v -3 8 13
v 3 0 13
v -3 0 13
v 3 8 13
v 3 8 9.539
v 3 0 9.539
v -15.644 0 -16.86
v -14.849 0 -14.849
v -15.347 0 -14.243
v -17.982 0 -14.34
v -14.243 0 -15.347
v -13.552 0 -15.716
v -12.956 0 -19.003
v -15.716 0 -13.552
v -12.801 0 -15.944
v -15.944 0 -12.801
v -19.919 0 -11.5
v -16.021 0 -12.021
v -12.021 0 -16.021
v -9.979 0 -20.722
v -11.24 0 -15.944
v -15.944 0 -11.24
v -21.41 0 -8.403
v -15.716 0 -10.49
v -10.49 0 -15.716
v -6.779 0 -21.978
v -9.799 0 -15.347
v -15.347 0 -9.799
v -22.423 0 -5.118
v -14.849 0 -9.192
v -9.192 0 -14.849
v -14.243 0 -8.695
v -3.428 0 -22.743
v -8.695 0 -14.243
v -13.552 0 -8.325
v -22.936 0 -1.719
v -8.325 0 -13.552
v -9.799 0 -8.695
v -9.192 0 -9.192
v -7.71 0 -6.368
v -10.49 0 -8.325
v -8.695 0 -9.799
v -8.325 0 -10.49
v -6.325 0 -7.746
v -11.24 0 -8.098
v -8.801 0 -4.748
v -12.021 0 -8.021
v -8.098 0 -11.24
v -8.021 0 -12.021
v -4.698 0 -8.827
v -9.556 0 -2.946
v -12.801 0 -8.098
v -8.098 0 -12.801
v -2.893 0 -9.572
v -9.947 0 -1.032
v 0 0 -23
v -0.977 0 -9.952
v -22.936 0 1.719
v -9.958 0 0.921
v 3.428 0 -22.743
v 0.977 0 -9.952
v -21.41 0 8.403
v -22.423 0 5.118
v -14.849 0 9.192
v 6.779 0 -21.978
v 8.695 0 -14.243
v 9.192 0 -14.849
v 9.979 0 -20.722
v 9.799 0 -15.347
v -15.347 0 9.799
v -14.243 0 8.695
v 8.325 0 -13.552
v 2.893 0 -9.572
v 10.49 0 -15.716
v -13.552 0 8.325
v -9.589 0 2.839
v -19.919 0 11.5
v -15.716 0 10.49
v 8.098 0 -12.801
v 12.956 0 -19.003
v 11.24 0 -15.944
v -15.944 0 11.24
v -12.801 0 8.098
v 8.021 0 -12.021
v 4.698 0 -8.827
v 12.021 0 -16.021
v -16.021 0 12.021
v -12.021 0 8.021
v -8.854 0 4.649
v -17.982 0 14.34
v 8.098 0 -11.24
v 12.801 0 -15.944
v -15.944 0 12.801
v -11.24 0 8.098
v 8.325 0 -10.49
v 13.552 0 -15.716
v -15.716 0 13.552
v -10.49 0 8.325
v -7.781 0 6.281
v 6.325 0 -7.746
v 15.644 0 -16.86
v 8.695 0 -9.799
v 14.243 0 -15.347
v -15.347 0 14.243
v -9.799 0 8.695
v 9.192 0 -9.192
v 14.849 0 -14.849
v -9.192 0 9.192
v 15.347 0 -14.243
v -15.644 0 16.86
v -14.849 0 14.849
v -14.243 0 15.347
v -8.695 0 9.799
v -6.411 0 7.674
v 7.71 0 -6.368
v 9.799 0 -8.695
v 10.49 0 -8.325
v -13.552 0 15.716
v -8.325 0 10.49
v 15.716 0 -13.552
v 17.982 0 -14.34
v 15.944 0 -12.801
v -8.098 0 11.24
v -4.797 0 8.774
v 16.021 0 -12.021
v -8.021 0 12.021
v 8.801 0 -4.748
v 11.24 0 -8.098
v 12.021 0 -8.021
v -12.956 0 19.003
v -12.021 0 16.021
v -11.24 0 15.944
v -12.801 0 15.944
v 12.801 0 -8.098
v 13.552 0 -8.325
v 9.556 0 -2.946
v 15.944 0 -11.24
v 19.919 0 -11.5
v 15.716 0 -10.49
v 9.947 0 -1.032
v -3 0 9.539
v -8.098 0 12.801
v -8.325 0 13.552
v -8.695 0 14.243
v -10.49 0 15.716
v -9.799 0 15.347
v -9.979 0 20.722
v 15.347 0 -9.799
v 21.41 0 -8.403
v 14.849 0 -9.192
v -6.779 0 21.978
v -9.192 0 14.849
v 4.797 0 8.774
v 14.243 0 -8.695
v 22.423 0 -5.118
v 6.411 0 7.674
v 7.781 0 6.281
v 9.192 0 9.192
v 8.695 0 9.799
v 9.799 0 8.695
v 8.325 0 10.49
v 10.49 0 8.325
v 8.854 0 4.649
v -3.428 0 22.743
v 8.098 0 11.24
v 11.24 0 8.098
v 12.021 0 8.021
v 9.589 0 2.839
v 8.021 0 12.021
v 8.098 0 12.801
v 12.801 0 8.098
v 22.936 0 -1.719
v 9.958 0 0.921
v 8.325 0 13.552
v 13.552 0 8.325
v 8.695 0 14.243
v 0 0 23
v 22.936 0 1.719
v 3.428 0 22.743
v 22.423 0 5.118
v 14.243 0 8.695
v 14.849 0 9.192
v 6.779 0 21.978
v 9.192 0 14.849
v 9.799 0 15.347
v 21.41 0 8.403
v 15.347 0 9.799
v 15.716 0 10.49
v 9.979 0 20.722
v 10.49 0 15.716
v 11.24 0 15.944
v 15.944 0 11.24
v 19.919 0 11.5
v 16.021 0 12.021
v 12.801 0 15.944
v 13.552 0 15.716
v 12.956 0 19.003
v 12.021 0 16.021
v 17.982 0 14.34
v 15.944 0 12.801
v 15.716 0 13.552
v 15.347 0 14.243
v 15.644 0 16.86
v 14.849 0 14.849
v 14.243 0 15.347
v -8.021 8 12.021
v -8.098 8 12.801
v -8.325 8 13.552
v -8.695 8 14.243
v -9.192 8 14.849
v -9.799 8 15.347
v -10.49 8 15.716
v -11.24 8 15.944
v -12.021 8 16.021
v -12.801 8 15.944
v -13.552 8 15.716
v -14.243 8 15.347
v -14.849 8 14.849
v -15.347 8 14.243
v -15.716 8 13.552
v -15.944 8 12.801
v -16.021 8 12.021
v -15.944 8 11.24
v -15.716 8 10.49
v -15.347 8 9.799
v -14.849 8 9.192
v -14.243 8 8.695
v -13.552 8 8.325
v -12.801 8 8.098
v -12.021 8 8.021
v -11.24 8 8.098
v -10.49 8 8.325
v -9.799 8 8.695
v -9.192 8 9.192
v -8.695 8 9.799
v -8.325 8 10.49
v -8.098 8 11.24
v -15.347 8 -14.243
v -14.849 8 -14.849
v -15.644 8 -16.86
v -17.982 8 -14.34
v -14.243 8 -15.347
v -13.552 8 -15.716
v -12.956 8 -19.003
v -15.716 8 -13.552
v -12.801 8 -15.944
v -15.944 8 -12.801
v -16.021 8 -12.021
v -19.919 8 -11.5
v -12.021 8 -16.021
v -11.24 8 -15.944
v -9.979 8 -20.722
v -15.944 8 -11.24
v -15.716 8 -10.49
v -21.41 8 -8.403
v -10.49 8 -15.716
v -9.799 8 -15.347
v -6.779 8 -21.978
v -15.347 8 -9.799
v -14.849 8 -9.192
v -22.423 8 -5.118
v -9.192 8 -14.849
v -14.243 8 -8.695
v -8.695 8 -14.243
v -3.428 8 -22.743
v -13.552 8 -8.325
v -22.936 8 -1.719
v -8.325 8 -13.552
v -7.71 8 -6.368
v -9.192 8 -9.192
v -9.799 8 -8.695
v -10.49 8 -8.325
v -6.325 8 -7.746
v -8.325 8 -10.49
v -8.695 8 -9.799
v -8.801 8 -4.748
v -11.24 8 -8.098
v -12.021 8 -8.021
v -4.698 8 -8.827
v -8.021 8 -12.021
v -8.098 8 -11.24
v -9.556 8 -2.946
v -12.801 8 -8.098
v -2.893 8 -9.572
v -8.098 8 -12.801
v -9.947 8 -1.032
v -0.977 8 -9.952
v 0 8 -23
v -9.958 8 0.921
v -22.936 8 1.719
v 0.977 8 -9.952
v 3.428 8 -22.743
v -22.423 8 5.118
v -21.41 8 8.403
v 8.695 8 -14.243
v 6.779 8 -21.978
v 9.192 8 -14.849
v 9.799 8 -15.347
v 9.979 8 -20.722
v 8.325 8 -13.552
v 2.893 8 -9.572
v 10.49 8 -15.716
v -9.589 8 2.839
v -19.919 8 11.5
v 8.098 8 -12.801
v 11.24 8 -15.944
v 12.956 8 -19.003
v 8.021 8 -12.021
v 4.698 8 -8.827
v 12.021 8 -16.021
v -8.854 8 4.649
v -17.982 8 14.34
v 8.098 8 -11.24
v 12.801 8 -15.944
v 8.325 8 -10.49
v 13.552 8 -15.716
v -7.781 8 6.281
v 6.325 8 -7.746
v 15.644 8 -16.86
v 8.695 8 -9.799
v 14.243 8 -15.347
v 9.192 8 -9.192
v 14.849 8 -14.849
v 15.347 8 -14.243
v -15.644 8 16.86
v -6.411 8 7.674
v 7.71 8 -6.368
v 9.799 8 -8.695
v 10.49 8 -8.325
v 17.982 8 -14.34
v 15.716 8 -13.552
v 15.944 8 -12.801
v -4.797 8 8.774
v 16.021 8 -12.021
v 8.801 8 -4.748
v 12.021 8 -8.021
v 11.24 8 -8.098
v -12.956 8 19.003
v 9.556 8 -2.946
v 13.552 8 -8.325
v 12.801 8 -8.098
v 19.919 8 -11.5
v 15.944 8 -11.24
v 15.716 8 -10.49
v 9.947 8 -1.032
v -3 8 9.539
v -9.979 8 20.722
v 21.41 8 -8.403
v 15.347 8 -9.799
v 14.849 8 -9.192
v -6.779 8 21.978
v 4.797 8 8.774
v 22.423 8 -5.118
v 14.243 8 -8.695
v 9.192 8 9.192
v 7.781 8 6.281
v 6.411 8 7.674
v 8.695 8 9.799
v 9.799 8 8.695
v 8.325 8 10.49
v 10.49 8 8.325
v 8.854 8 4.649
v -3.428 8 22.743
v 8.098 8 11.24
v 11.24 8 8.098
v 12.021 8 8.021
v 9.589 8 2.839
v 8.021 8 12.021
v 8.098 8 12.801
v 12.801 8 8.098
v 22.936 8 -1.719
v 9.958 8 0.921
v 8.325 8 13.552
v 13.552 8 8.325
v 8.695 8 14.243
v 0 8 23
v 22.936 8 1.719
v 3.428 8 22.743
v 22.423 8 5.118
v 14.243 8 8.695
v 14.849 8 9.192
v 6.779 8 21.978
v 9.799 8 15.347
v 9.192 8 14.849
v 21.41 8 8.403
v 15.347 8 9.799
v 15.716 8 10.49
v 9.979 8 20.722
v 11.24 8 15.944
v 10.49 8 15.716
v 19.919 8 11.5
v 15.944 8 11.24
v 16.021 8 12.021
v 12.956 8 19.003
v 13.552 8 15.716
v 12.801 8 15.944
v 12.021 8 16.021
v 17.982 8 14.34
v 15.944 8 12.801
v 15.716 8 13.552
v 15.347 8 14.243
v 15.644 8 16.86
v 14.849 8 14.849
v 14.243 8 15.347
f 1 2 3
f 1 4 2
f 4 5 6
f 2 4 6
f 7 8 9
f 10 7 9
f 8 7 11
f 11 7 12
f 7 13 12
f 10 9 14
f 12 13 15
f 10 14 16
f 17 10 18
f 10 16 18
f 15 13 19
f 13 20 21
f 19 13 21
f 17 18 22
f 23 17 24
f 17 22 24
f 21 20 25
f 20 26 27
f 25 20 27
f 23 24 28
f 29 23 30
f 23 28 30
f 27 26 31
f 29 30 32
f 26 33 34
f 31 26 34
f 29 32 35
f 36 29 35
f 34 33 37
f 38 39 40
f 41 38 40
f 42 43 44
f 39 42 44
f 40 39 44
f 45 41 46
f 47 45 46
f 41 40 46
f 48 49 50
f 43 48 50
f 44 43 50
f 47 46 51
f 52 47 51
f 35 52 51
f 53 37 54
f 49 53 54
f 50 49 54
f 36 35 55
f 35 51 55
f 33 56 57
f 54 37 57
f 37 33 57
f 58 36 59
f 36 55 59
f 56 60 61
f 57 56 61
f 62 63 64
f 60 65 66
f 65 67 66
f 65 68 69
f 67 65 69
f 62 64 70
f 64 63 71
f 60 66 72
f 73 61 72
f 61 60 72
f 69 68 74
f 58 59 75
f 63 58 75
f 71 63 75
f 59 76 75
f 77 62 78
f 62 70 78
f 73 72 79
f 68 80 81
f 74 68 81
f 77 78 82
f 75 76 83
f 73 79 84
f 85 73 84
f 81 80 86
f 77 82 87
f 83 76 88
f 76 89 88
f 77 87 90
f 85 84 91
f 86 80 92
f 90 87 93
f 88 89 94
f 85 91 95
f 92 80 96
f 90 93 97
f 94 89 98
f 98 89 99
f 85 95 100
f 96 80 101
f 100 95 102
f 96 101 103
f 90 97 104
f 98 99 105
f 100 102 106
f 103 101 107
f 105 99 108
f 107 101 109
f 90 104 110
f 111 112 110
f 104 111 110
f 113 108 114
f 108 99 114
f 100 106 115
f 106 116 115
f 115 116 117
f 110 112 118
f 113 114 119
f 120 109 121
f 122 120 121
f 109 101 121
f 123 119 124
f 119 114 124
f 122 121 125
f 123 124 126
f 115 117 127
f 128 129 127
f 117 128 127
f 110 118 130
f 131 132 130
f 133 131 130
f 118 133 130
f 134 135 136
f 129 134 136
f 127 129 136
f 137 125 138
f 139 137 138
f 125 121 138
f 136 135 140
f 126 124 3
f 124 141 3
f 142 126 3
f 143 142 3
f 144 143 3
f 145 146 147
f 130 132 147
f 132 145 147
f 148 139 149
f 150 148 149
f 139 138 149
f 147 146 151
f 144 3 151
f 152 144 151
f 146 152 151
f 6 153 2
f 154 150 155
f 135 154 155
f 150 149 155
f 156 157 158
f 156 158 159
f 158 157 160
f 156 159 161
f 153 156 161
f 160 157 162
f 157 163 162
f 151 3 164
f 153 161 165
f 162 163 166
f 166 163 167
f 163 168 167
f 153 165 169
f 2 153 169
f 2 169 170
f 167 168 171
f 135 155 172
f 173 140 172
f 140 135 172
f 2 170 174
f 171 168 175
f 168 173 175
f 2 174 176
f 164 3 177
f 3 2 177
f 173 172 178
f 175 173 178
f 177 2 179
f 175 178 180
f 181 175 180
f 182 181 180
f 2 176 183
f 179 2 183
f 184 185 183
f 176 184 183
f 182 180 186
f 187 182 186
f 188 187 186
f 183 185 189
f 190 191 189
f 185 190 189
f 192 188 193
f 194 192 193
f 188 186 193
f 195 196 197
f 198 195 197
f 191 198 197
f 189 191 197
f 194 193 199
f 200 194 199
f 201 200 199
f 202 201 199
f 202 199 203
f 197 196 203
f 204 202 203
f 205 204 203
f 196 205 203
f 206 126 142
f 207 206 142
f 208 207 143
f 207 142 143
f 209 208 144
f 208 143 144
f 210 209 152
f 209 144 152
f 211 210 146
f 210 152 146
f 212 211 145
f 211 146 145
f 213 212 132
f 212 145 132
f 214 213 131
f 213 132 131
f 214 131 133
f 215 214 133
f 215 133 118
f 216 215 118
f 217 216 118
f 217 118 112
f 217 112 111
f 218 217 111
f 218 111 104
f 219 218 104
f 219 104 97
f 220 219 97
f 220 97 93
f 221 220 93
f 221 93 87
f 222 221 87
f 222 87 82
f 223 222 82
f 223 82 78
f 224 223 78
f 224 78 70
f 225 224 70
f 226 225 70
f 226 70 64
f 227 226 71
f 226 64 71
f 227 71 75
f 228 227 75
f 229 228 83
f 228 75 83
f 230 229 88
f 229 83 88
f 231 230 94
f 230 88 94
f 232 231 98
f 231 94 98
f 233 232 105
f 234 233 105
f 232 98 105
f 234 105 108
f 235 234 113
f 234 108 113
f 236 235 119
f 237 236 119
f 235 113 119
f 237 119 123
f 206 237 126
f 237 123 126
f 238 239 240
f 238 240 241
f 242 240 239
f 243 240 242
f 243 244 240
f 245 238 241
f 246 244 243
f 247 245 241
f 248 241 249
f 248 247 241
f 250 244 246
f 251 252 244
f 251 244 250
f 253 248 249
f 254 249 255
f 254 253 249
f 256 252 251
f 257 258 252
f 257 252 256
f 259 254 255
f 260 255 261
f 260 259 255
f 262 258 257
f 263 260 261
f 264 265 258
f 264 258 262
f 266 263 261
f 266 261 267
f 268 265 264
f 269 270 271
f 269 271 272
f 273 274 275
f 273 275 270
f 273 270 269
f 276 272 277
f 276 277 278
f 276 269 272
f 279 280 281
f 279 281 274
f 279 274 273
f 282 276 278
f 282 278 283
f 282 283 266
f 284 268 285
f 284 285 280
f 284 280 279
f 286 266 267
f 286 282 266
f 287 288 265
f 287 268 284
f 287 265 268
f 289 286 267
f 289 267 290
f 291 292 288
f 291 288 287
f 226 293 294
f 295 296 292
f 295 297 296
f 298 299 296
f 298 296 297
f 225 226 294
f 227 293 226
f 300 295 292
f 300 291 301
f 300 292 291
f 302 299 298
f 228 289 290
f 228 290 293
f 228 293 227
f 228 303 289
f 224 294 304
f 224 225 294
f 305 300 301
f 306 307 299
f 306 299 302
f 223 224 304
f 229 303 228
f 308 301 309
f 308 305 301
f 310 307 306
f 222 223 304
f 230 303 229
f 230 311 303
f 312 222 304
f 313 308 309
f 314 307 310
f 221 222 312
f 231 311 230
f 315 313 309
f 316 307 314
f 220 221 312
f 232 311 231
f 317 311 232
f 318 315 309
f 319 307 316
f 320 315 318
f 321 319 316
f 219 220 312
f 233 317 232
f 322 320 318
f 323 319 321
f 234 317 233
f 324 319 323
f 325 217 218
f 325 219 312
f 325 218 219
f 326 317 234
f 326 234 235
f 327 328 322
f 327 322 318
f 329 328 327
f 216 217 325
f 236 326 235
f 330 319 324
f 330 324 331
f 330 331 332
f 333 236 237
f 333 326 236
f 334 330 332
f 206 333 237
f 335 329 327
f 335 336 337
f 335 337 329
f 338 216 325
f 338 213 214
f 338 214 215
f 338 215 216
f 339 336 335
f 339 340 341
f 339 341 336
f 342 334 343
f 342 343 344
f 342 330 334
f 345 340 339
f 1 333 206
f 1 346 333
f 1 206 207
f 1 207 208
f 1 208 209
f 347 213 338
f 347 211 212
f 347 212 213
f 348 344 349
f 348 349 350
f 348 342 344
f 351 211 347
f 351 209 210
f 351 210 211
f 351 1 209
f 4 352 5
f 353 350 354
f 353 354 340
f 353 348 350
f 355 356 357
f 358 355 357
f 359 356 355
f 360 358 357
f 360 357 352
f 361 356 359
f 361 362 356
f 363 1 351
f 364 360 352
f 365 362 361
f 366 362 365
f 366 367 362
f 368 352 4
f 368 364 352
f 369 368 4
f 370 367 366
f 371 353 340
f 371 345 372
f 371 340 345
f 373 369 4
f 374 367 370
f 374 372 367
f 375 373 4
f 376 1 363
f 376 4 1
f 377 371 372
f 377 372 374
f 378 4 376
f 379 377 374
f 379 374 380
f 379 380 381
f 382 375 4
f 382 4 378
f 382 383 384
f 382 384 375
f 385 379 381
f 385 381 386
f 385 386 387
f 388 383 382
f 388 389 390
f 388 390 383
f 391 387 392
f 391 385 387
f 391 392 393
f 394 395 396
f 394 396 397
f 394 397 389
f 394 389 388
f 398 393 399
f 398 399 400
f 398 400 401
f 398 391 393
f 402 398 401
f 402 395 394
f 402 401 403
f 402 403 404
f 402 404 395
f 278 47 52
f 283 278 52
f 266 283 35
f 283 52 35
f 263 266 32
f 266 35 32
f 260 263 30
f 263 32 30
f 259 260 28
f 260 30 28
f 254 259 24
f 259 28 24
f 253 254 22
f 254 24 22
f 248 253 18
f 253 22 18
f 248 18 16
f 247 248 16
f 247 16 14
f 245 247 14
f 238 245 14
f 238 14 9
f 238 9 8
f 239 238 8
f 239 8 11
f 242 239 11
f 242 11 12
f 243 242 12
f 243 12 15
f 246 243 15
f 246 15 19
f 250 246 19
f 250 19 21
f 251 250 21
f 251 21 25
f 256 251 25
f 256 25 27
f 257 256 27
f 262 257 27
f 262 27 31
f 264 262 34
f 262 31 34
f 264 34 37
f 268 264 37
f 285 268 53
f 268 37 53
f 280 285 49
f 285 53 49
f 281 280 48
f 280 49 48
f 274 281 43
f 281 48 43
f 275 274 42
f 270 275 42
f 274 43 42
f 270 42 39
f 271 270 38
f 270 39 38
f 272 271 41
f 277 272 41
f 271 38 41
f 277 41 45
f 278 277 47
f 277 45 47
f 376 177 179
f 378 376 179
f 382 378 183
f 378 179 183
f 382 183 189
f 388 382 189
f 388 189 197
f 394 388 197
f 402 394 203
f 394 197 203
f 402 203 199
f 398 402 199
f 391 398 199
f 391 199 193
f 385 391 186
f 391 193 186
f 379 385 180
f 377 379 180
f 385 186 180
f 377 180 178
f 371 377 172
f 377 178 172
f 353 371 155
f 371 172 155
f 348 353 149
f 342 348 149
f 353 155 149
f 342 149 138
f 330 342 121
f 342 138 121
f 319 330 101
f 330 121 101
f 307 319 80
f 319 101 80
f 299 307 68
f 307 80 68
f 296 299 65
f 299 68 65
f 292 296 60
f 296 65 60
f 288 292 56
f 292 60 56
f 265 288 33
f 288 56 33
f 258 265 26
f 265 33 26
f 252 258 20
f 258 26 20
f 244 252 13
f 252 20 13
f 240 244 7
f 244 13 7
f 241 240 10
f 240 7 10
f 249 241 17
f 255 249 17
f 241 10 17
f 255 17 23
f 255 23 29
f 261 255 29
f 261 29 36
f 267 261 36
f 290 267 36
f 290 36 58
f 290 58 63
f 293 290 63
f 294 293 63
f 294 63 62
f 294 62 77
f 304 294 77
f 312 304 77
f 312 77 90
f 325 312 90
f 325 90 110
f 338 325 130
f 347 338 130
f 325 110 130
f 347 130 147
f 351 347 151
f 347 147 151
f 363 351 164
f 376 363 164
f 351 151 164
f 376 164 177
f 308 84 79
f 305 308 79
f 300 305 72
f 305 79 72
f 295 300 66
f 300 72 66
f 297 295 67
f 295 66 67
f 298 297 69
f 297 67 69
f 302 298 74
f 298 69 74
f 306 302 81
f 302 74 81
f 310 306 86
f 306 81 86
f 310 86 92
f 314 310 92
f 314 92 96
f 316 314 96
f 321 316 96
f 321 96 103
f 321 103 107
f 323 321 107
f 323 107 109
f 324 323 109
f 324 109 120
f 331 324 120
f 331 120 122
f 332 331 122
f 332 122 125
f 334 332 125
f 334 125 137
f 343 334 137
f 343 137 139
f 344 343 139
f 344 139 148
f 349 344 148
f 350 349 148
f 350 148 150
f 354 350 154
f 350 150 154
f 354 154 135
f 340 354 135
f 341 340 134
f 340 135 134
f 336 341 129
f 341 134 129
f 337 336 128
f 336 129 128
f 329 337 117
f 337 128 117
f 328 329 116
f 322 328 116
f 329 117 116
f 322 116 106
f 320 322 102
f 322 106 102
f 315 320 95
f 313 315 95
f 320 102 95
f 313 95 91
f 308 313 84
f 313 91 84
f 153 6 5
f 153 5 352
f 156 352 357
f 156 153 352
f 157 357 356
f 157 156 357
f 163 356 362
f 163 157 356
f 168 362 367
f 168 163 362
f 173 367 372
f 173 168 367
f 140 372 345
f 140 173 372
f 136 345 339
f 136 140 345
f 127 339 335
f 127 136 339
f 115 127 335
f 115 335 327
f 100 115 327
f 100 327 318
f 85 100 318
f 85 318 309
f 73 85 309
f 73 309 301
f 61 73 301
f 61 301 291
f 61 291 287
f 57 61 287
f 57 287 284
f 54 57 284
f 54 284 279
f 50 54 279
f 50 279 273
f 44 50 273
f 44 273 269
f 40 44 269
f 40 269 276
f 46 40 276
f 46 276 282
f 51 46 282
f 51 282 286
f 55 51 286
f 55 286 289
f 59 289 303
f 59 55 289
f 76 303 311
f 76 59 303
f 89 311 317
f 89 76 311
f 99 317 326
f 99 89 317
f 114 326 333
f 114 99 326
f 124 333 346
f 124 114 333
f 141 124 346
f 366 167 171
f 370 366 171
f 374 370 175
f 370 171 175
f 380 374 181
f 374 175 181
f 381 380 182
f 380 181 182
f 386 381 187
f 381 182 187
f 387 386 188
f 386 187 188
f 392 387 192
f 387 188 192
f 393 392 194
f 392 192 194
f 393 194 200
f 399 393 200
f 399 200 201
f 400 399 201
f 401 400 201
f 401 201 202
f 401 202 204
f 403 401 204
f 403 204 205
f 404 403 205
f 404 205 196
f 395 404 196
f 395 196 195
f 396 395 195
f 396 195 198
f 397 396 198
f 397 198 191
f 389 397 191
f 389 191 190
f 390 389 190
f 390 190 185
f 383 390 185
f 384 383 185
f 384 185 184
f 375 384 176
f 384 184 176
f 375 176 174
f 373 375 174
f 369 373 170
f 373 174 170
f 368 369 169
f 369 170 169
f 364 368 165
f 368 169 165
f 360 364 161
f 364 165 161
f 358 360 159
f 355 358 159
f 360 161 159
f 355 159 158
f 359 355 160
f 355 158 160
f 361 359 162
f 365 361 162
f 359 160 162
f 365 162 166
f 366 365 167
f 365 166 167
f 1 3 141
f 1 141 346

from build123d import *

# Parameters (mm, degrees)
ESQUISSE1_R                  = 23
ESQUISSE1_R_2                = 10
BOSS_EXTRU_1_DEPTH           = 8
ENL_V_MAT_EXTRU_1_DEPTH      = 3
ENL_V_MAT_EXTRU_1_DEPTH_BACK = 1
ESQUISSE4_R                  = 4
ENL_V_MAT_EXTRU_2_DEPTH      = 9
R_P_TITION_CIRCULAIRE1_COUNT = 4


with BuildPart() as part:
    # Esquisse1 → Boss.-Extru.1 (new body)
    with BuildSketch(Plane(origin=(0, 0, 0), x_dir=(1, 0, 0), z_dir=(0, 1, 0))):
        with Locations(Location((0, 0, 0), (0, 0, 270))):  # turned: the seam where the file's is
            Circle(ESQUISSE1_R)
        with Locations(Location((0, 0, 0), (0, 0, 270))):  # turned: the seam where the file's is
            Circle(ESQUISSE1_R_2, mode=Mode.SUBTRACT)
    extrude(amount=BOSS_EXTRU_1_DEPTH)

    # Esquisse2 → Enlèv. mat.-Extru.1 (cut, two sides)
    with BuildSketch(Plane.XY.offset(10)) as enl_v_mat_extru_1_sk:
        with BuildLine():
            Line((-3, 0), (-3, 12))
            ThreePointArc((-3, 12), (0, 15), (3, 12))
            Line((3, 12), (3, 0))
            ThreePointArc((3, 0), (0, -3), (-3, 0))
        make_face()
    extrude(amount=ENL_V_MAT_EXTRU_1_DEPTH, mode=Mode.SUBTRACT)
    extrude(enl_v_mat_extru_1_sk.sketch, amount=-ENL_V_MAT_EXTRU_1_DEPTH_BACK, mode=Mode.SUBTRACT)

    # Esquisse4 → Enlèv. mat.-Extru.2 (cut, through all)
    with BuildSketch(Plane.XZ):
        with Locations(Location((12.02081528, 12.02081528, 0), (0, 0, 270))):  # turned: the seam where the file's is
            Circle(ESQUISSE4_R)
    enl_v_mat_extru_2 = extrude(amount=-ENL_V_MAT_EXTRU_2_DEPTH, mode=Mode.SUBTRACT)

    # Répétition circulaire1: Enlèv. mat.-Extru.2 ×4 about axis
    r_p_tition_circulaire1_axis = Axis((0, 0, 0), (0, 1, 0))
    for i in range(1, R_P_TITION_CIRCULAIRE1_COUNT):
        add(enl_v_mat_extru_2.rotate(r_p_tition_circulaire1_axis, i * 360 / R_P_TITION_CIRCULAIRE1_COUNT), mode=Mode.SUBTRACT)


solid = part.part
